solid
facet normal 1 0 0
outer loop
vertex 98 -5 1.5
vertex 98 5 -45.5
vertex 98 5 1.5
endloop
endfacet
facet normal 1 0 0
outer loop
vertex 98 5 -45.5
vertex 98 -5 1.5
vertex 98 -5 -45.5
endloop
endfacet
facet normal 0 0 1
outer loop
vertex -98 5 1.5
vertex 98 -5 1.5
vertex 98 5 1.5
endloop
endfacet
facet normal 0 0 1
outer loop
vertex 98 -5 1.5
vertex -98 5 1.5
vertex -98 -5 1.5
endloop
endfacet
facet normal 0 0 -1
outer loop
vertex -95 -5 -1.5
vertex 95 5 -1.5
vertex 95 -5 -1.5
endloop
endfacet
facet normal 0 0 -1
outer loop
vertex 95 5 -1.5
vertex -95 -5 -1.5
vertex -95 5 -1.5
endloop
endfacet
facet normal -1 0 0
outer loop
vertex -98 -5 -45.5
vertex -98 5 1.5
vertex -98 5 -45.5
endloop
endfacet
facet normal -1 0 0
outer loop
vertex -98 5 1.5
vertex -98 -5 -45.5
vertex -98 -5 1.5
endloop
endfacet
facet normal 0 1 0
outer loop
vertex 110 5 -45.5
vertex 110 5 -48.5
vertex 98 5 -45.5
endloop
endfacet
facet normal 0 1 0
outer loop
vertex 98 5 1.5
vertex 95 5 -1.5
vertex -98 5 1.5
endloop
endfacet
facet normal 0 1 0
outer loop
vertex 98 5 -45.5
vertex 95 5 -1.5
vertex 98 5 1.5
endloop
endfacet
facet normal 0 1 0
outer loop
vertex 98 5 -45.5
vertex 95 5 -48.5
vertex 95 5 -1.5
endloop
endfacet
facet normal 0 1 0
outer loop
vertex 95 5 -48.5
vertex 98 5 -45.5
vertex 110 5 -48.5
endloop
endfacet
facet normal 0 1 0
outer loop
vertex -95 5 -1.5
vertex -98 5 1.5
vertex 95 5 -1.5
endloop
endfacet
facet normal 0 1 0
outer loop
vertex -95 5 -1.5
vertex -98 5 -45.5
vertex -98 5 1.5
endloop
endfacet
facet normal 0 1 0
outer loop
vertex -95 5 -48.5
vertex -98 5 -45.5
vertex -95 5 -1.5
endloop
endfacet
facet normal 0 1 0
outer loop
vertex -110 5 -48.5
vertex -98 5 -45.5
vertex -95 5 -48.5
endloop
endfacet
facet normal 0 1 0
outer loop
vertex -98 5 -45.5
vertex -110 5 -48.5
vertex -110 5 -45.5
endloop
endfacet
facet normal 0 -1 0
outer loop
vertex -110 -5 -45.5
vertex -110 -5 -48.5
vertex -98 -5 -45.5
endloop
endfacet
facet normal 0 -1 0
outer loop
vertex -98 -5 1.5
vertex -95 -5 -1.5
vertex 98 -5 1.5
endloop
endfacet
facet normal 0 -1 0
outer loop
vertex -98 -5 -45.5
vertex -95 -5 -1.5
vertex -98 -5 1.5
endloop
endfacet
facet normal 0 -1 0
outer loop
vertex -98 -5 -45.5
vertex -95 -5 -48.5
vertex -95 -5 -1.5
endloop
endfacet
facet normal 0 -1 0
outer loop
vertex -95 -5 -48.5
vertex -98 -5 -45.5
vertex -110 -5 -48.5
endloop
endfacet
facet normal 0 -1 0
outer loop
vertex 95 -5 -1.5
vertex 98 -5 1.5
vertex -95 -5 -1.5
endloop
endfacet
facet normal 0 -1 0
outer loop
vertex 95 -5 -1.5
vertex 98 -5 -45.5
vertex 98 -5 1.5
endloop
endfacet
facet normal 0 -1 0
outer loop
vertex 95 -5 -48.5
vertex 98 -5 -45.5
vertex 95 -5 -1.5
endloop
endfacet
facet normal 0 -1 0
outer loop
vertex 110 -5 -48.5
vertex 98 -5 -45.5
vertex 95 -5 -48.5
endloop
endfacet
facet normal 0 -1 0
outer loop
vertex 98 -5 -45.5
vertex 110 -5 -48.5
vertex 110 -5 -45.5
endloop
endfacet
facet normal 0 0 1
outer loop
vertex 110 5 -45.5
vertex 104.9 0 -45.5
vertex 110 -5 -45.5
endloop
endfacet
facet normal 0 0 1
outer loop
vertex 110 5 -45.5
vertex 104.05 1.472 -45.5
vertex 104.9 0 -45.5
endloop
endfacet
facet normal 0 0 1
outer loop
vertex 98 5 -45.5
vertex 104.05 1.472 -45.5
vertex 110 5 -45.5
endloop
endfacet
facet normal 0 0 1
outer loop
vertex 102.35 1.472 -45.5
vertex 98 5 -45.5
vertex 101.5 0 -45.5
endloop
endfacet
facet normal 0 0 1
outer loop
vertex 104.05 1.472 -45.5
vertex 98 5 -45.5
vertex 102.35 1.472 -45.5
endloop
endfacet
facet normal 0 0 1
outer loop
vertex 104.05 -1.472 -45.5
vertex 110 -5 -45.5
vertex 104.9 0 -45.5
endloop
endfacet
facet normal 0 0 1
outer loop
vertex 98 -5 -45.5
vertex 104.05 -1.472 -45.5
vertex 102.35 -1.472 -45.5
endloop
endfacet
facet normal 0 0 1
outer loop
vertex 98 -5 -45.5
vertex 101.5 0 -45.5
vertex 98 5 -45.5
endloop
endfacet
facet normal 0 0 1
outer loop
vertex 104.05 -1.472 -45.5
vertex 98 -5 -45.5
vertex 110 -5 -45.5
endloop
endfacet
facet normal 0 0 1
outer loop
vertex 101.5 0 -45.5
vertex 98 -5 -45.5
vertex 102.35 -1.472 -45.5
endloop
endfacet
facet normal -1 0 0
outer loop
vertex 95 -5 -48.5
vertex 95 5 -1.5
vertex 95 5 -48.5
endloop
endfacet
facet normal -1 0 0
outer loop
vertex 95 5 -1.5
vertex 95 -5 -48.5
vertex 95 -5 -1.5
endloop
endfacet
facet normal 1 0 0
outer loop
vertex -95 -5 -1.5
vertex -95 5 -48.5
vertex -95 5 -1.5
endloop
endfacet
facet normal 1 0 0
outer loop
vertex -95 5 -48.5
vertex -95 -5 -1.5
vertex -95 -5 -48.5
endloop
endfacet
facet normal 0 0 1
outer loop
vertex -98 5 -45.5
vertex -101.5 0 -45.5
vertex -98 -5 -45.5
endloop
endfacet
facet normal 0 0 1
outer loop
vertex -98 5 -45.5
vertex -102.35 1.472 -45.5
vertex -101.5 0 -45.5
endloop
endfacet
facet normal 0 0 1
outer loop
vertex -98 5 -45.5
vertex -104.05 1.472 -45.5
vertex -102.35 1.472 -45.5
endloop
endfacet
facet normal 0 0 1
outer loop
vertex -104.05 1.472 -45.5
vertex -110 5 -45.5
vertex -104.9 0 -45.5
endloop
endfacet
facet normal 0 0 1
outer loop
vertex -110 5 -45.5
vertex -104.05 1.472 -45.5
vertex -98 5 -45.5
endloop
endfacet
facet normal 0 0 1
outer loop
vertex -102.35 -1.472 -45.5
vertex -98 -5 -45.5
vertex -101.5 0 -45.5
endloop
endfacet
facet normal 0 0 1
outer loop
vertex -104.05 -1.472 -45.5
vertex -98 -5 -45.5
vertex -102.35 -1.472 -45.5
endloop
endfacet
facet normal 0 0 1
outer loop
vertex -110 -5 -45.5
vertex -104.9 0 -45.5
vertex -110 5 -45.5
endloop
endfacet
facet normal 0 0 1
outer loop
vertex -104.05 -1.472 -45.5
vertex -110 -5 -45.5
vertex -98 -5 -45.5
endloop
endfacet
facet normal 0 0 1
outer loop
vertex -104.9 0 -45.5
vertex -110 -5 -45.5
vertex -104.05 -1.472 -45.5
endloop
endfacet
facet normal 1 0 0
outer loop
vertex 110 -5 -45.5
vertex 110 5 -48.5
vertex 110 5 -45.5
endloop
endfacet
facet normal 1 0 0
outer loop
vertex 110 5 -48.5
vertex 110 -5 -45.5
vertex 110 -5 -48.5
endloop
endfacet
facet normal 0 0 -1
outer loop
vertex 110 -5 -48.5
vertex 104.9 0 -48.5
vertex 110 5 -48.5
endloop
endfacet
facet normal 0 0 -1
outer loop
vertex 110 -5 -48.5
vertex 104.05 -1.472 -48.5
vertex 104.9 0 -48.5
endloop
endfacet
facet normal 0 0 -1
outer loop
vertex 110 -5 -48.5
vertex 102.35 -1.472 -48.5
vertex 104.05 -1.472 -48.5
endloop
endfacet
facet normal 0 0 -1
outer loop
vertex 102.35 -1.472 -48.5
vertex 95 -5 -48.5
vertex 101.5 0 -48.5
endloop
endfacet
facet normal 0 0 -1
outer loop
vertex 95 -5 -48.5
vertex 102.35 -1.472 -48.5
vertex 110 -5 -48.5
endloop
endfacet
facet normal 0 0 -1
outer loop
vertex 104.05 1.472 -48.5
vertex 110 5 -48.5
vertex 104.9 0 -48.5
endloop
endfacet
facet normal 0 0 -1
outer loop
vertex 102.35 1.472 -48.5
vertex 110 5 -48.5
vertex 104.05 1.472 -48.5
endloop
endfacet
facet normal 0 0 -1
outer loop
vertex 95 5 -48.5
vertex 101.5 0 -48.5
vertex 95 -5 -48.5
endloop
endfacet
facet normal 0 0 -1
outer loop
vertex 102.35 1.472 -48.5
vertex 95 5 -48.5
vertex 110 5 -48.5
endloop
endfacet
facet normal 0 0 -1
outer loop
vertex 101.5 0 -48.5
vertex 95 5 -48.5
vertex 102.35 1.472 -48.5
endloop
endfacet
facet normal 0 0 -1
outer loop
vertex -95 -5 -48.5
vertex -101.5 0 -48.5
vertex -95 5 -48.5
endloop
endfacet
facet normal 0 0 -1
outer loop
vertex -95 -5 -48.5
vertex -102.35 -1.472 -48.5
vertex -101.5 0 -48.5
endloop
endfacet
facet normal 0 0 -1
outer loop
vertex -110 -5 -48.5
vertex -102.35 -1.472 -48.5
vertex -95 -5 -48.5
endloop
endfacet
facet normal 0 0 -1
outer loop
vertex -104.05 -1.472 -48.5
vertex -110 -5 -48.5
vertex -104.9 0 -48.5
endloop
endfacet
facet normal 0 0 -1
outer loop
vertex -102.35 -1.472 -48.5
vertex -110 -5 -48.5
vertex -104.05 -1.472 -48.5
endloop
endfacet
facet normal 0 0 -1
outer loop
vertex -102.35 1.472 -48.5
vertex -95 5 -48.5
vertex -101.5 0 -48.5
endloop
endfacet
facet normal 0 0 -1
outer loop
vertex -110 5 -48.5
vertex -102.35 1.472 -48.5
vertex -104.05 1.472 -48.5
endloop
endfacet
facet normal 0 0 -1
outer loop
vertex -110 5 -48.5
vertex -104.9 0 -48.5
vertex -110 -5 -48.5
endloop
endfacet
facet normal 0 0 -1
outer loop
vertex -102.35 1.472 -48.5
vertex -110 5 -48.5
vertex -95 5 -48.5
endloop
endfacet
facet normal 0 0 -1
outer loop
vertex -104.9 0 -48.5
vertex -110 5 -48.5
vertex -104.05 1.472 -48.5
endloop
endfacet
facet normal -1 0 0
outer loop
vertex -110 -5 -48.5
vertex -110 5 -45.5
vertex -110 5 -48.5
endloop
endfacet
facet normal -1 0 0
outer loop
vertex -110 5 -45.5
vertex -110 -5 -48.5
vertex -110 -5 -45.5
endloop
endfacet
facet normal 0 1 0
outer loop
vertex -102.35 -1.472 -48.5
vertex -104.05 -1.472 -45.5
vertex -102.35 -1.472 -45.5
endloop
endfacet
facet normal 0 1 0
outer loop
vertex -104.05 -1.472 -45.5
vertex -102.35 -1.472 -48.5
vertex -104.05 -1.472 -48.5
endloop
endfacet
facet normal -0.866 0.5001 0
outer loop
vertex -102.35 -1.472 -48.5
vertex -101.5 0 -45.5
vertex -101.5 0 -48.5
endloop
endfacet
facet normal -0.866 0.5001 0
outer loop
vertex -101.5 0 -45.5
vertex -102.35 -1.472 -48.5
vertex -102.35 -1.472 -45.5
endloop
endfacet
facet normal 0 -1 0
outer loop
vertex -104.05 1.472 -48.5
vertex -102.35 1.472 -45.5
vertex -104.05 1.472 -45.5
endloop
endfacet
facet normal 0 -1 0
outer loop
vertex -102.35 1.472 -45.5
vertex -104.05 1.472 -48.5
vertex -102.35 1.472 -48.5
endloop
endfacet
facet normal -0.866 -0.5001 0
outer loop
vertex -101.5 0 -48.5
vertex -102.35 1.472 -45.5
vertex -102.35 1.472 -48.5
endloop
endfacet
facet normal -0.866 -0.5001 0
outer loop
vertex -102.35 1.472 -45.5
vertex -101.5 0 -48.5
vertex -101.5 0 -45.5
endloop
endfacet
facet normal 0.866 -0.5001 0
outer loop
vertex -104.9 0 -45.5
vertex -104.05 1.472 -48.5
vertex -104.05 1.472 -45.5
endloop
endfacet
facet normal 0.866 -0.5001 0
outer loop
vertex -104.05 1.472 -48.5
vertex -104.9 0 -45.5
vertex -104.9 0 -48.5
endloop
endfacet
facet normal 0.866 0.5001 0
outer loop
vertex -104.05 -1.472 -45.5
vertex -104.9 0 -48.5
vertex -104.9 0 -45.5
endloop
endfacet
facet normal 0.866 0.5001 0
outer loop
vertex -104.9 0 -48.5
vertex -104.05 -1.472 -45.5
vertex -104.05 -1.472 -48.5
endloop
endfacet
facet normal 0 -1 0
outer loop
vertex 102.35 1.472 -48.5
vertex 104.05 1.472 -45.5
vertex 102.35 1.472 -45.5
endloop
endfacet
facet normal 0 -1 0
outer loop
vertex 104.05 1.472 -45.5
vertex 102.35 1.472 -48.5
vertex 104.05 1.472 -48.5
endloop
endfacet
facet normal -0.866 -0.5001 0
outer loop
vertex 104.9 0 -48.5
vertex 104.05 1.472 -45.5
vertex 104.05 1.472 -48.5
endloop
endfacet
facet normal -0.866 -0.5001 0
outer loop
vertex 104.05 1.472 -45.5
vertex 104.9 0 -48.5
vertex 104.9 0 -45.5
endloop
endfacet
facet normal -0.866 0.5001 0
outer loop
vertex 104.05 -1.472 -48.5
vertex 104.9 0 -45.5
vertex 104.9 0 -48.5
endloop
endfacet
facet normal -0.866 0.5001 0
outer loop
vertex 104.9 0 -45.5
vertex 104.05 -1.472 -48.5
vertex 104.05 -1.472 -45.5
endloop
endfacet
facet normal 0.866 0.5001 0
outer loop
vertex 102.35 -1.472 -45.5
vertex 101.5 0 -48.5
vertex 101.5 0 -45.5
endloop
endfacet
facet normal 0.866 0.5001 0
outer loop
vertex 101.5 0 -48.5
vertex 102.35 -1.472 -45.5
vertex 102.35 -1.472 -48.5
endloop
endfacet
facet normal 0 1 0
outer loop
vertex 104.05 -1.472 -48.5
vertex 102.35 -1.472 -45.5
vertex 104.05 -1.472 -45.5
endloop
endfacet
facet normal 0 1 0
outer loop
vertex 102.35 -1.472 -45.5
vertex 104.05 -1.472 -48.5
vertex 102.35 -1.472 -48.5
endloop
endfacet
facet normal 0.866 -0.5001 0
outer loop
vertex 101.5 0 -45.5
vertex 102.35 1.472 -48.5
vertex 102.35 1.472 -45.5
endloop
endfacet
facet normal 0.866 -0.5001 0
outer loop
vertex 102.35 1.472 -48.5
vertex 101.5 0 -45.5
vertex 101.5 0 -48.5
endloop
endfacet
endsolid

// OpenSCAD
/*******************************************************************************
 * A U bracket for mounting.
 ******************************************************************************/

module uBracket(
  width,
  height,
  thickness,
  depth,
  mountWidth,
  screwDiameter
) {
  difference() {
    union() {
      cube([width + thickness * 2, depth, thickness], center=true);
      // Stands.
      translate([(width + thickness) / 2, 0, (height + thickness) / -2])
        cube([thickness, depth, height], center=true);
      translate([(width + thickness) / -2, 0, (height + thickness) / -2])
        cube([thickness, depth, height], center=true);
      // Mounting surface.
      translate([(width / 2) + (mountWidth / 2), 0, -(height + thickness)])
        cube([mountWidth, depth, thickness], center=true);
      translate([-((width / 2) + (mountWidth / 2)), 0, -(height + thickness)])
        cube([mountWidth, depth, thickness], center=true);
    }
    // Counter sinks.
    translate([
      -((width / 2) + mountWidth - (screwDiameter * 2)),
      0,
      -(height + thickness),
    ])
      cylinder(d=screwDiameter, h=thickness * 1.5, center=true);
    translate([
      ((width / 2) + mountWidth - (screwDiameter * 2)),
      0,
      -(height + thickness),
    ])
      cylinder(d=screwDiameter, h=thickness * 1.5, center=true);
  }
}

// Measured 45mm high but reduce to pinch.
// Measured 187mm wide but rounded to 190mm to fit.
// Measured 3.4mm for screw.
uBracket(190, 44, 3, 10, 15, 3.4);
